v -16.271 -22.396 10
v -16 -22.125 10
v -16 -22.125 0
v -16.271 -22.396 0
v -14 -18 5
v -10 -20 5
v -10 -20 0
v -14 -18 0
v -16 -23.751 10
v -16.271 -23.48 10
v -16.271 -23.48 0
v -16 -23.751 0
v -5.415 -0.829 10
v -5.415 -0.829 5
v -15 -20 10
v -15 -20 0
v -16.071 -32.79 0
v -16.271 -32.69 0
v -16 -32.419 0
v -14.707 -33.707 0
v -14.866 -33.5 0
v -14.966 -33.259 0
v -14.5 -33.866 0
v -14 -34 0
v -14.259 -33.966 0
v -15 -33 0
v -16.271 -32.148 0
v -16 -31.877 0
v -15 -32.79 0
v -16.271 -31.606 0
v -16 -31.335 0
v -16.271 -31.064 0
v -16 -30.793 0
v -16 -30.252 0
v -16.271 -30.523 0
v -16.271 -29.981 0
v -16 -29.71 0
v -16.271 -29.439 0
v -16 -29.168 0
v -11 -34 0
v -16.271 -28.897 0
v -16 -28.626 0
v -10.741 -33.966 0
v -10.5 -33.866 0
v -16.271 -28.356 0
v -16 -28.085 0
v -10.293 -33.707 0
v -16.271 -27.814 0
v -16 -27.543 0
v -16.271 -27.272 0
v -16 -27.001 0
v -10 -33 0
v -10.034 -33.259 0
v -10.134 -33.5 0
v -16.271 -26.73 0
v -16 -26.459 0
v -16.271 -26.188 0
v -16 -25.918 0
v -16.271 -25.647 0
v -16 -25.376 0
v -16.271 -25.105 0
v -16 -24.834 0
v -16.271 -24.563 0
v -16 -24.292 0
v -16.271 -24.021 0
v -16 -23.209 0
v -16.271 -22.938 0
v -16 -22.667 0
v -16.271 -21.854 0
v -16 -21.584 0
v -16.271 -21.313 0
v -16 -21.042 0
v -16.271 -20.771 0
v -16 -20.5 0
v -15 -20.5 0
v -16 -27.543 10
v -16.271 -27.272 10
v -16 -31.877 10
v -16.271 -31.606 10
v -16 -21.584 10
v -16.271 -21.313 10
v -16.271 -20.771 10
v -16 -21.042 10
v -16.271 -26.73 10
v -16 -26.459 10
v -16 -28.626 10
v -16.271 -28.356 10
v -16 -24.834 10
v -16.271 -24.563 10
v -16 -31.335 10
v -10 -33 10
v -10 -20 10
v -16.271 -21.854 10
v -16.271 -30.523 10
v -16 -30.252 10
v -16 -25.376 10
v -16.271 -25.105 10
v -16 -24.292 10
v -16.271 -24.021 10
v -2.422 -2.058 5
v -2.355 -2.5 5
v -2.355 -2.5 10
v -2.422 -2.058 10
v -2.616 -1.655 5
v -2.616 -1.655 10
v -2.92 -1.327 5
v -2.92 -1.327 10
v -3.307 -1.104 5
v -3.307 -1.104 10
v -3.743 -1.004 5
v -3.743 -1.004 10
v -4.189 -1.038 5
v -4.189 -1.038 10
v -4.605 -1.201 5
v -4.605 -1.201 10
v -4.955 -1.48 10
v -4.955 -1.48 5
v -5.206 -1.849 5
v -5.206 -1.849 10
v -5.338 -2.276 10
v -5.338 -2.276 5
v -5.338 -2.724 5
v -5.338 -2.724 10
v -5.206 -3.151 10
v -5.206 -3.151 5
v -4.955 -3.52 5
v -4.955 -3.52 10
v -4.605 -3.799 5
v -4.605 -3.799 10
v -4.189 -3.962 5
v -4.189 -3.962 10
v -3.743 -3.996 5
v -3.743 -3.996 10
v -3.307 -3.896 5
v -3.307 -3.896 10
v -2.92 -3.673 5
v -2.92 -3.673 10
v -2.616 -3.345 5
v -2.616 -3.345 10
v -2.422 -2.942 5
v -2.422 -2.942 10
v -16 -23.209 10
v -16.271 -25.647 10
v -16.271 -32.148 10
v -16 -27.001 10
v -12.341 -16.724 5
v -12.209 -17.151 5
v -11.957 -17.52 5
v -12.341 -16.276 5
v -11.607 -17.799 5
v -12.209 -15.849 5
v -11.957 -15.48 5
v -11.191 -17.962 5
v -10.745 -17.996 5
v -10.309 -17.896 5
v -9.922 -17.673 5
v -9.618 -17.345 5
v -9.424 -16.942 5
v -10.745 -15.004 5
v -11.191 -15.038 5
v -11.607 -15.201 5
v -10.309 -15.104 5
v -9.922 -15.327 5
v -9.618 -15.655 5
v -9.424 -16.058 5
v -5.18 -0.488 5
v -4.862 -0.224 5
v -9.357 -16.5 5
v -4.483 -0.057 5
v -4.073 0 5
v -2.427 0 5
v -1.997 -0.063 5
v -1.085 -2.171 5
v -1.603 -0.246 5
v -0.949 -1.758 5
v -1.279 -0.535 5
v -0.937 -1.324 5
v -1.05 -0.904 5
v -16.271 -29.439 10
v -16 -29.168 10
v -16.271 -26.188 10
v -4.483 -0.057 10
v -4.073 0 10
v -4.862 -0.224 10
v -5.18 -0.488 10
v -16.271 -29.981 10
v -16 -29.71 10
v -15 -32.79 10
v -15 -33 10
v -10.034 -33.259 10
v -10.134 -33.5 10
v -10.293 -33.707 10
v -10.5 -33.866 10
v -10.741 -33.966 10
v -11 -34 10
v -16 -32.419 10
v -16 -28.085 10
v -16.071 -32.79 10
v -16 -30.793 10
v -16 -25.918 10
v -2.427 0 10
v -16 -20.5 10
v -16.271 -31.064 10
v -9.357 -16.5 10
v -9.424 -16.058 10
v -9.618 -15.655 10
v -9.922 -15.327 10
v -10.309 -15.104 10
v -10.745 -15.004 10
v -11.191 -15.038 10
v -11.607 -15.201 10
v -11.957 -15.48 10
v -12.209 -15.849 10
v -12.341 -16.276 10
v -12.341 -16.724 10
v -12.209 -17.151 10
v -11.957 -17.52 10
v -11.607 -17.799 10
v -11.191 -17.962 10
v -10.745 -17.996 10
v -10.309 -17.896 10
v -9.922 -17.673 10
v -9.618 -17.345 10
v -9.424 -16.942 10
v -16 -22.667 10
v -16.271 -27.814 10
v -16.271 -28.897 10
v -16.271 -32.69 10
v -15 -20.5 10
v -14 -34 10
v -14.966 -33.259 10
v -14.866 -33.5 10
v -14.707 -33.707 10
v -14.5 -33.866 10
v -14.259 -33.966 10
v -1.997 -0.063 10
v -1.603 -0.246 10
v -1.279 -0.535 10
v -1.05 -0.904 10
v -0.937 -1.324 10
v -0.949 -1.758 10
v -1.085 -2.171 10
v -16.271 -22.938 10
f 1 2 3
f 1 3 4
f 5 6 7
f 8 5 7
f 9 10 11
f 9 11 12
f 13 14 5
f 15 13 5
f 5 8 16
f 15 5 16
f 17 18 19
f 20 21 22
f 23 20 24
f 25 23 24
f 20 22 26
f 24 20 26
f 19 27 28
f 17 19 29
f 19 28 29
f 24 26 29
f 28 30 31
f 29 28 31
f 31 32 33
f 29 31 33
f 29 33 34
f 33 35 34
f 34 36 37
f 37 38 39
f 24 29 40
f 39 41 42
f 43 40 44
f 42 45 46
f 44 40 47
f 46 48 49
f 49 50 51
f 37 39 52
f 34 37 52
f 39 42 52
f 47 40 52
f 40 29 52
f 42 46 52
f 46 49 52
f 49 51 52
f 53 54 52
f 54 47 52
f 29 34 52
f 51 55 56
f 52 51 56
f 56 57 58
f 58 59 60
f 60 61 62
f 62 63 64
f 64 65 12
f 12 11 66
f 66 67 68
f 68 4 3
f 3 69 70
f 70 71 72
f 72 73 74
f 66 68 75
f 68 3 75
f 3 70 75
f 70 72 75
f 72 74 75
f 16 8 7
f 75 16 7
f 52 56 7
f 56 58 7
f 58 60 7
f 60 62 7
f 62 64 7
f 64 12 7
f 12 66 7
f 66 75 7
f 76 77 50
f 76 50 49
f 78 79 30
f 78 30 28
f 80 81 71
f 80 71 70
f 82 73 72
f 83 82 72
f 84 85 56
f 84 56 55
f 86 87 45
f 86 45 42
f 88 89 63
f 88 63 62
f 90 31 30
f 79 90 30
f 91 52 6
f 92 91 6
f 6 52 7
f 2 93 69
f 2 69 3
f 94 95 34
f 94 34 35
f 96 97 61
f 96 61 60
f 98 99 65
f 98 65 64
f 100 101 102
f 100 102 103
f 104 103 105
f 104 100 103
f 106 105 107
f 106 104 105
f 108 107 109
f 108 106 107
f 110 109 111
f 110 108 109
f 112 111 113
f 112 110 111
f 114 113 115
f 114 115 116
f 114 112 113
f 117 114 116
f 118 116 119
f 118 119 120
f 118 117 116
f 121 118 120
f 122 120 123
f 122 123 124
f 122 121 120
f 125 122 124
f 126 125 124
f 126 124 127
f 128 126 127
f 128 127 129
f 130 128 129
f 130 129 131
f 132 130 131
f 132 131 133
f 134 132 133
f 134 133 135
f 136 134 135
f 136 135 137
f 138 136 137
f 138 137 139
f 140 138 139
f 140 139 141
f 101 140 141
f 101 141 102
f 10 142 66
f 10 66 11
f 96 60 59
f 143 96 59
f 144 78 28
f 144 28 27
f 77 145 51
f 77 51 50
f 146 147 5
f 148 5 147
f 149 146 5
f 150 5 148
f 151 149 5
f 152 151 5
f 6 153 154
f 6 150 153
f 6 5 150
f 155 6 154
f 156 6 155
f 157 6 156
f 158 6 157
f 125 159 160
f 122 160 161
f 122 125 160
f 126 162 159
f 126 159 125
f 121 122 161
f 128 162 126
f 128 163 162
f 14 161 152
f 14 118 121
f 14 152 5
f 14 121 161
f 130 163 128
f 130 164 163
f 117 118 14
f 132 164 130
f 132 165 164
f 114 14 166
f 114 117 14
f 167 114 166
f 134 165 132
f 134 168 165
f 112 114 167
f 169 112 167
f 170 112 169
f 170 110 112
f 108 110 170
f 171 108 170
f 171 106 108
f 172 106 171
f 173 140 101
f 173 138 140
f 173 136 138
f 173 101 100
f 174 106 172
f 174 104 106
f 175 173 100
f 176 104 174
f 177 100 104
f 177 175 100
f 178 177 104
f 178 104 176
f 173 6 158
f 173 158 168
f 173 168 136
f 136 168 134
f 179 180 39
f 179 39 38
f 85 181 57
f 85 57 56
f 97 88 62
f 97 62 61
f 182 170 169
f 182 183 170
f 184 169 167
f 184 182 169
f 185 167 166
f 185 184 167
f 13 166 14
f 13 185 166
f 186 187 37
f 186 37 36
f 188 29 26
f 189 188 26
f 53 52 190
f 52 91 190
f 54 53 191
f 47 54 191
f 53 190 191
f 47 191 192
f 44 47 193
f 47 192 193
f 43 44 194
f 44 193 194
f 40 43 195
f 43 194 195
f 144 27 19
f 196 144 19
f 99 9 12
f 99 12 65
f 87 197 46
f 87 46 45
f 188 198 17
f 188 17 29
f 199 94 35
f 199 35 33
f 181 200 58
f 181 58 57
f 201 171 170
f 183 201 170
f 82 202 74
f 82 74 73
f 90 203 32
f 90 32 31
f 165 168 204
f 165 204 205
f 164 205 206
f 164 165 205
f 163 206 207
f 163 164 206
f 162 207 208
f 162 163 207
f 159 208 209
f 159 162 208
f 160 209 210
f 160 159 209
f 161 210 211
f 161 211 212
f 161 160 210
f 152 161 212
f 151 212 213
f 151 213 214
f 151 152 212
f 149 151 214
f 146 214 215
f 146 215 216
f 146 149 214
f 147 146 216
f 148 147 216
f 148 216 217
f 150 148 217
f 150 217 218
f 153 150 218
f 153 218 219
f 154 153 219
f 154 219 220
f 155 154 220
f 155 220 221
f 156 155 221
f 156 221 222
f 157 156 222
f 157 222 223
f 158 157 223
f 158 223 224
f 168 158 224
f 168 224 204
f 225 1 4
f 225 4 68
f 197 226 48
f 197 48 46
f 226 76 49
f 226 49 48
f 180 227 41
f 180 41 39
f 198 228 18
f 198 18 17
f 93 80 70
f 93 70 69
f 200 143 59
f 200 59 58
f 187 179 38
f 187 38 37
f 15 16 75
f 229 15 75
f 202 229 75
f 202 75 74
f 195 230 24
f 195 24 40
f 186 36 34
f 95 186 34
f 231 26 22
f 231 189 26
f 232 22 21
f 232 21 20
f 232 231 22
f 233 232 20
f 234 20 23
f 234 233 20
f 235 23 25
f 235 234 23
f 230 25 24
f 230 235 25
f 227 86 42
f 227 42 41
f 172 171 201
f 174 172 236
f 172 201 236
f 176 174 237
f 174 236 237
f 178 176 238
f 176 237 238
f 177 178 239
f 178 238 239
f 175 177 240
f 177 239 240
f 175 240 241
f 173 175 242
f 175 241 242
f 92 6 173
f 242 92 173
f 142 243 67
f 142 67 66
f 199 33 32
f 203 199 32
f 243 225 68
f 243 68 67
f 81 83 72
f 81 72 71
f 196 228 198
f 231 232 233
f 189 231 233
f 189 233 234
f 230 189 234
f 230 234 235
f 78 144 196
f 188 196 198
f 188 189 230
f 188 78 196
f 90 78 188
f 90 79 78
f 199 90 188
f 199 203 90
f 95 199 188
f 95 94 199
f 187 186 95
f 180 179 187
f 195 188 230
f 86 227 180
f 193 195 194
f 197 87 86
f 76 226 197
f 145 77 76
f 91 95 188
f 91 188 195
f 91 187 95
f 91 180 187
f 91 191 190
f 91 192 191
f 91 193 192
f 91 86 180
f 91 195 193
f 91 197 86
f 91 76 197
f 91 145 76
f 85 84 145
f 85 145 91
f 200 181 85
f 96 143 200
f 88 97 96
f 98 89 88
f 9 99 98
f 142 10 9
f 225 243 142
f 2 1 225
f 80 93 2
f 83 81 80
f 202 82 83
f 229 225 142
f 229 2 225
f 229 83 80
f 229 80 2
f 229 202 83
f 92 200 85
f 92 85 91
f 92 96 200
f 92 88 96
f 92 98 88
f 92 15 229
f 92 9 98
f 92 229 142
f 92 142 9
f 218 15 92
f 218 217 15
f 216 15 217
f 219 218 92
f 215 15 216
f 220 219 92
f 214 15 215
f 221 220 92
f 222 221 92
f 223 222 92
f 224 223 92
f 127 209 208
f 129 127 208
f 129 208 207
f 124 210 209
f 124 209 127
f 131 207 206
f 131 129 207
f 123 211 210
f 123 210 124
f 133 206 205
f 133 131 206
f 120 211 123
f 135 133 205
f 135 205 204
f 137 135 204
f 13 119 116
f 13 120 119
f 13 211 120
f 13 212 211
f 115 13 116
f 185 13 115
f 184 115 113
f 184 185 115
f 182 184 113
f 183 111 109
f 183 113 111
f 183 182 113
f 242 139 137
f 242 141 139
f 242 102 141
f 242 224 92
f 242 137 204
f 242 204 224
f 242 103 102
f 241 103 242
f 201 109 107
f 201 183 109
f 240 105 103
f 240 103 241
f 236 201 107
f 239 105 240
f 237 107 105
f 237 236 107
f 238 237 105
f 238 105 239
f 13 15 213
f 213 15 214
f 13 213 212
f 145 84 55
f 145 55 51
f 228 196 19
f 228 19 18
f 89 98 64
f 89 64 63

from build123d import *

# Parameters (mm, degrees)
SKETCH2_R           = 1.5
BOSS_EXTRUDE1_DEPTH = 10
SKETCH4_W           = 5
SKETCH4_H           = 22.360679775
CUT_EXTRUDE1_DEPTH  = 10
FILLET1_R           = 1.5
FILLET2_R           = 1
BOSS_EXTRUDE2_DEPTH = 10


with BuildPart() as part:
    # Sketch2 → Boss-Extrude1 (new body)
    with BuildSketch(Plane.XY):
        Polygon((0, 0), (-5, 0), (-15, -20), (-15, -34), (-10, -34), (-10, -20), align=None)
        with Locations((-3.855019194, -2.5)):
            Circle(SKETCH2_R, mode=Mode.SUBTRACT)
        with Locations((-10.857407264, -16.5)):
            Circle(SKETCH2_R, mode=Mode.SUBTRACT)
    extrude(amount=BOSS_EXTRUDE1_DEPTH)

    # Sketch4 → Cut-Extrude1 (cut)
    with BuildSketch(Plane(origin=(0, 0, 0), x_dir=(0, 0, -1), z_dir=(0.894427191, -0.447213595, 0))):
        with Locations((-2.5, -11.180339888)):
            Rectangle(SKETCH4_W, SKETCH4_H)
    extrude(amount=-CUT_EXTRUDE1_DEPTH, mode=Mode.SUBTRACT)

    # Fillet1
    fillet1_edges = [part.edges().sort_by_distance(p)[0] for p in [
        (-5, 0, 7.5),
        (0, 0, 7.5),
    ]]
    fillet(fillet1_edges, radius=FILLET1_R)

    # Fillet2
    fillet2_edges = [part.edges().sort_by_distance(p)[0] for p in [
        (-15, -34, 5),
        (-10, -34, 5),
    ]]
    fillet(fillet2_edges, radius=FILLET2_R)

    # Sketch5 → Boss-Extrude2 (add)
    with BuildSketch(Plane.XY.offset(10)):
        Polygon((-15, -20.5), (-16, -20.5), (-16.270880122, -20.770880122), (-16, -21.041760245), (-16.270880122, -21.312640367), (-16, -21.58352049), (-16.270880122, -21.854400612), (-16, -22.125280734), (-16.270880122, -22.396160857), (-16, -22.667040979), (-16.270880122, -22.937921102), (-16, -23.208801224), (-16.270880122, -23.479681346), (-16, -23.750561469), (-16.270880122, -24.021441591), (-16, -24.292321714), (-16.270880122, -24.563201836), (-16, -24.834081958), (-16.270880122, -25.104962081), (-16, -25.375842203), (-16.270880122, -25.646722326), (-16, -25.917602448), (-16.270880122, -26.188482571), (-16, -26.459362693), (-16.270880122, -26.730242815), (-16, -27.001122938), (-16.270880122, -27.27200306), (-16, -27.542883183), (-16.270880122, -27.813763305), (-16, -28.084643427), (-16.270880122, -28.35552355), (-16, -28.626403672), (-16.270880122, -28.897283795), (-16, -29.168163917), (-16.270880122, -29.439044039), (-16, -29.709924162), (-16.270880122, -29.980804284), (-16, -30.251684407), (-16.270880122, -30.522564529), (-16, -30.793444651), (-16.270880122, -31.064324774), (-16, -31.335204896), (-16.270880122, -31.606085019), (-16, -31.876965141), (-16.270880122, -32.147845263), (-16, -32.418725386), (-16.270880122, -32.689605508), (-16.070783647, -32.79), (-15, -32.79), align=None)
    extrude(amount=-BOSS_EXTRUDE2_DEPTH)


solid = part.part
